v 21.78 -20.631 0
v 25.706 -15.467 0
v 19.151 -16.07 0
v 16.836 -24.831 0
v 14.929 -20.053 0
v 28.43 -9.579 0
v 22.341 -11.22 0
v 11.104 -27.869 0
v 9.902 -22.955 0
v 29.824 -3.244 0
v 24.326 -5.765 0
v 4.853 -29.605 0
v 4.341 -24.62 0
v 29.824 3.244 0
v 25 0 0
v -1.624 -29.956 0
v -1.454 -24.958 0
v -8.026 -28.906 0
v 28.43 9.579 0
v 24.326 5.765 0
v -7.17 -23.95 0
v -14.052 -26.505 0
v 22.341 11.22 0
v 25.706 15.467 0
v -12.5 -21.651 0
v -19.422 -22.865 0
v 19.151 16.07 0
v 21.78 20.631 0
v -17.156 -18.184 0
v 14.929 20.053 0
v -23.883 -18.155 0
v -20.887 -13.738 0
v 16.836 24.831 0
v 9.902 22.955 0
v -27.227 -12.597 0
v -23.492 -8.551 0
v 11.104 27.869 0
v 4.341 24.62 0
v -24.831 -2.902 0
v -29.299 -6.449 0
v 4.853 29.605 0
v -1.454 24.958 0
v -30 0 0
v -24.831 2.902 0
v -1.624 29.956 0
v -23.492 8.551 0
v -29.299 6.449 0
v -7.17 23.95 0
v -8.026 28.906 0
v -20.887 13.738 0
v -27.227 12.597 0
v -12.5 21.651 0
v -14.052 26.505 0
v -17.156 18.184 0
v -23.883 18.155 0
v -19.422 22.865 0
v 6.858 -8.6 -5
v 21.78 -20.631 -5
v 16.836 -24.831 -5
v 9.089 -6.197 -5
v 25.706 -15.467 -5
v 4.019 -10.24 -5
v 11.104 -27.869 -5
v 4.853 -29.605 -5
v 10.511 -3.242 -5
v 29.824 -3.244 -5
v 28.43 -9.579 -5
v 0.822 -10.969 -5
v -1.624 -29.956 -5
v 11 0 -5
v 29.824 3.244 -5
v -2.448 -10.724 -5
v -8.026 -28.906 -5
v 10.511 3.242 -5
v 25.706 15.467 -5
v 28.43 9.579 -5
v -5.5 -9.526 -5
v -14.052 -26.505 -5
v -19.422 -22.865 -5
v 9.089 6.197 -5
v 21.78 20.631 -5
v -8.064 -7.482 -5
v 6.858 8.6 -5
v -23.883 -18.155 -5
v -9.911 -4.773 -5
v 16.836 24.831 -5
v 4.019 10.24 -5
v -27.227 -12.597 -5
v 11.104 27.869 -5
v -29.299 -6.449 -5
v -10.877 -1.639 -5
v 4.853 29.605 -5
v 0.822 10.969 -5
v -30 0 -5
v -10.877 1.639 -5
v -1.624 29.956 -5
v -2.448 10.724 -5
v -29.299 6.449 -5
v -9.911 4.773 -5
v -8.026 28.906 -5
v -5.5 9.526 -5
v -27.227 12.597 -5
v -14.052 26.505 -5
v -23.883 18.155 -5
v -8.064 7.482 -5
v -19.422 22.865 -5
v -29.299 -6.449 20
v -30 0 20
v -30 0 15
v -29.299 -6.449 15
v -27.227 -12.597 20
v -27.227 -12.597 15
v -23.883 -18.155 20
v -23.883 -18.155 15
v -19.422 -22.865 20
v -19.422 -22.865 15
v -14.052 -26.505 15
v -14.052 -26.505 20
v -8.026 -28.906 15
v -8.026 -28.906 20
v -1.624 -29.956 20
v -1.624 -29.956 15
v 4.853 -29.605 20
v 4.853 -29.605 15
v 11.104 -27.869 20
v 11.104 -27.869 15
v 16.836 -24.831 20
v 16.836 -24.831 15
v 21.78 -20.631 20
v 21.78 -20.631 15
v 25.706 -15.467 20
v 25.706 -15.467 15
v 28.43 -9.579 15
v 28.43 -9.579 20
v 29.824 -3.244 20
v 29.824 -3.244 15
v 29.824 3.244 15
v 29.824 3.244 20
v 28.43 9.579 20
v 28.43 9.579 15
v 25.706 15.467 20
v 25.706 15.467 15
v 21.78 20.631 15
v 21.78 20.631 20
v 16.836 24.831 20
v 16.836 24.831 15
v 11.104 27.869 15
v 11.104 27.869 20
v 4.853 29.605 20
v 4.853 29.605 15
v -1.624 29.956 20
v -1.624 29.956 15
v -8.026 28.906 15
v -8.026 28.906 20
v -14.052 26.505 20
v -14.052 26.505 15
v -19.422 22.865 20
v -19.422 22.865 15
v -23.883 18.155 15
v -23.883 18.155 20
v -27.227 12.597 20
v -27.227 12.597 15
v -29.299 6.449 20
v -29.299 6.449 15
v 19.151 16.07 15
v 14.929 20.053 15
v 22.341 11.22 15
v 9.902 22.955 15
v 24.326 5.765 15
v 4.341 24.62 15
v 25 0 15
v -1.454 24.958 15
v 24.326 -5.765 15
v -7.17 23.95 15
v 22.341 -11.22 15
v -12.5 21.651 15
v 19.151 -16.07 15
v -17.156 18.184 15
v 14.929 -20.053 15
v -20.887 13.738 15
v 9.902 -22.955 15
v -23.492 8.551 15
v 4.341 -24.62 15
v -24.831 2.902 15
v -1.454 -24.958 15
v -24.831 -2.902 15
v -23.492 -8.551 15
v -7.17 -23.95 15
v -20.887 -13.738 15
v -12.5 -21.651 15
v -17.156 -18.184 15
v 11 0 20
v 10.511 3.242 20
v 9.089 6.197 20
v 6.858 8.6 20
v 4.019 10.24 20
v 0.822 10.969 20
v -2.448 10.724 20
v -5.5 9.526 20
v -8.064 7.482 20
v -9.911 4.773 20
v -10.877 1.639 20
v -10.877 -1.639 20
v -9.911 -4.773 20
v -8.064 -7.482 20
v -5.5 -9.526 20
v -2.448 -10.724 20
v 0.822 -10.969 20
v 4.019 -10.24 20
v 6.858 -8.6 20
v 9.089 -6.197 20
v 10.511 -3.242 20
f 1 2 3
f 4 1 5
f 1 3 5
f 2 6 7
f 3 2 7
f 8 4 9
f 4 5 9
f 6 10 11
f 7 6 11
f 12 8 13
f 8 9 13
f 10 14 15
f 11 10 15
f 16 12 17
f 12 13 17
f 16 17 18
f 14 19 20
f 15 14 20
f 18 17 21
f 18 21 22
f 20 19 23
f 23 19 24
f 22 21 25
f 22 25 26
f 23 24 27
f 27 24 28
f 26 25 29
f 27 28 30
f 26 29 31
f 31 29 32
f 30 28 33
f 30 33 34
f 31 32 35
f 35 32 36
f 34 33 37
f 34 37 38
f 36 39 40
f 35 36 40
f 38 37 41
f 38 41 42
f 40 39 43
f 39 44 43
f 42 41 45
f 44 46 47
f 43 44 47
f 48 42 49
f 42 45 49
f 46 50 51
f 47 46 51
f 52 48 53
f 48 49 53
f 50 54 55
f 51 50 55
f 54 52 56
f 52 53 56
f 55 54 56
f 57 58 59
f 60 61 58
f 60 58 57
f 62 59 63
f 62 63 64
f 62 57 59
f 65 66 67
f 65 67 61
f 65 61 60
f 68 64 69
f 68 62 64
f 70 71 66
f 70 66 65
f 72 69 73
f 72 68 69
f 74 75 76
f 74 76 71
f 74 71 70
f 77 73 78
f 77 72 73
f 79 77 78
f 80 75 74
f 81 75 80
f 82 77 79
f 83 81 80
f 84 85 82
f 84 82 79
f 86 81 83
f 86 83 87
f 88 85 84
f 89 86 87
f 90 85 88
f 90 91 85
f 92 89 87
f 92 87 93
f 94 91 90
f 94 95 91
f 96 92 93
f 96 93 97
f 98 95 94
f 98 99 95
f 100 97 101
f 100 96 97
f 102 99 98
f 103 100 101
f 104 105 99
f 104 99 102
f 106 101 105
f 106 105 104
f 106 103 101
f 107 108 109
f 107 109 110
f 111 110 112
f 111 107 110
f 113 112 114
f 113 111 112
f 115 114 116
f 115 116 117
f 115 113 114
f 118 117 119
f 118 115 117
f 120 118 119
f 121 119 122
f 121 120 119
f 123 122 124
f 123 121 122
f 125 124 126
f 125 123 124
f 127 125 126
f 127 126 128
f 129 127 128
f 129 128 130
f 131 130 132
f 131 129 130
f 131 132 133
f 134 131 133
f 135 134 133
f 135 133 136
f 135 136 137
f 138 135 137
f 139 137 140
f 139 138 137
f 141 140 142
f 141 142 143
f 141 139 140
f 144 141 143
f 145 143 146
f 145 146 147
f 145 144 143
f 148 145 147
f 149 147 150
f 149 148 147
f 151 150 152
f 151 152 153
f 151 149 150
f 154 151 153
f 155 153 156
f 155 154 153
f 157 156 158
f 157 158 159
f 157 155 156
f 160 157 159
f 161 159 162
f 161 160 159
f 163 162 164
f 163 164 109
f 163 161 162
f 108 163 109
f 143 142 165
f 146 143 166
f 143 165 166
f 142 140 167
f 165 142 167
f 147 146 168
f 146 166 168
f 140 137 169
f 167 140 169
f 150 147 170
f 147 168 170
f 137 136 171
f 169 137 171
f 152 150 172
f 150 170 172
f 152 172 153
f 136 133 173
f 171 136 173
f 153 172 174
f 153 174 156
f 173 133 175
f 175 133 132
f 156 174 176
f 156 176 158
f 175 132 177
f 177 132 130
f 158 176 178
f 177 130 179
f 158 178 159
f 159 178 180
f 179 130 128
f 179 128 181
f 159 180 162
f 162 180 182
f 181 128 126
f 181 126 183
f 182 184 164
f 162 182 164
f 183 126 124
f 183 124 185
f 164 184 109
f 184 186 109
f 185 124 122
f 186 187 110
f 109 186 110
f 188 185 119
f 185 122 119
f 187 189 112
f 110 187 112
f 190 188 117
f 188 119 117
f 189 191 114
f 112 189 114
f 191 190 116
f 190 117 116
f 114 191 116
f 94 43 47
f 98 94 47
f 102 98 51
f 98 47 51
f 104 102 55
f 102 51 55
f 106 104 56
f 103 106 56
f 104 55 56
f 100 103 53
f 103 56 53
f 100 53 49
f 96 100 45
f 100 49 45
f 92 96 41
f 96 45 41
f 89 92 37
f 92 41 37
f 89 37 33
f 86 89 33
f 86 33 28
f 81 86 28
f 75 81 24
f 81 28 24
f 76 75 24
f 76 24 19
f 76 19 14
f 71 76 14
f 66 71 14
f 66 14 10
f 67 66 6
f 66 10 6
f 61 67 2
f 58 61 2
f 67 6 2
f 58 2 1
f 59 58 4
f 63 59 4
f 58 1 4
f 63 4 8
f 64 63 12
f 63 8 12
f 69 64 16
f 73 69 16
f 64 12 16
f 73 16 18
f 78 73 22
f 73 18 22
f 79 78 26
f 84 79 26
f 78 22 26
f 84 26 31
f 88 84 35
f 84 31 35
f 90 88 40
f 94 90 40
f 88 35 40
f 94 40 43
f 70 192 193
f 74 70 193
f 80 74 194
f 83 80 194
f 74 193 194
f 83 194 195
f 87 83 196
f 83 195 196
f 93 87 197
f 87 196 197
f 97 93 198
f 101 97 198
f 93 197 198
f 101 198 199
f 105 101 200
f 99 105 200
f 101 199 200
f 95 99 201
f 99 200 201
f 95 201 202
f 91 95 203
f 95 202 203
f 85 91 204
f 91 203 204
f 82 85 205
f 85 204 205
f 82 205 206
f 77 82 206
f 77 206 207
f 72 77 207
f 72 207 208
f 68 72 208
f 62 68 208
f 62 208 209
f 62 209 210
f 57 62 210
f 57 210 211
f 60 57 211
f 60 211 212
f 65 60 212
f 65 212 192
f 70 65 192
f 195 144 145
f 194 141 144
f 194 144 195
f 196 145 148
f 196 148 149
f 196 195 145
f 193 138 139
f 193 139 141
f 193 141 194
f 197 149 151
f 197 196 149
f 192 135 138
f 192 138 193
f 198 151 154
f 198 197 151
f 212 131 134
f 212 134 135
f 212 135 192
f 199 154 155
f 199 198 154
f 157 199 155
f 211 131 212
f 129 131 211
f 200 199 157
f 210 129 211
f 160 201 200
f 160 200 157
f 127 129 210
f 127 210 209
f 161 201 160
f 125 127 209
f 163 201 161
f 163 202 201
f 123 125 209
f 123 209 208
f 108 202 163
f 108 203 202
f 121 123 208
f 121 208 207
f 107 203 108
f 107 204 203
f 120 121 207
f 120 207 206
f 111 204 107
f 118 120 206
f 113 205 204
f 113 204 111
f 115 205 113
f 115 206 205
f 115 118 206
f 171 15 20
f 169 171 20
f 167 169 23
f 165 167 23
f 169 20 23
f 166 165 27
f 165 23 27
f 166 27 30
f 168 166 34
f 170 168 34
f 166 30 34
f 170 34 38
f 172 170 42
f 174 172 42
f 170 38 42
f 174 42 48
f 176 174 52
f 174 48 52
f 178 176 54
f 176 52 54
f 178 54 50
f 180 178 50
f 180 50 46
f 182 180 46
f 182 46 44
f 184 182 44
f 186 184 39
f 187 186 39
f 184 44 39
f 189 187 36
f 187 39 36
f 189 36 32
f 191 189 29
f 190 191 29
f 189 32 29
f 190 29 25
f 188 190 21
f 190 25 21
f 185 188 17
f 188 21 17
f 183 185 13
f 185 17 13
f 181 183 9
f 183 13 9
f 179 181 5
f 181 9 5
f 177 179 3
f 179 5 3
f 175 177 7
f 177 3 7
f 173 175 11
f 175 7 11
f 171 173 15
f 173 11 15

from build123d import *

# Parameters (mm, degrees)
IZIM1_R                     = 25
Y_KSEKLIK_EKSTR_ZYON1_DEPTH = 15
IZIM3_R                     = 30
Y_KSEKLIK_EKSTR_ZYON2_DEPTH = 5
Y_KSEKLIK_EKSTR_ZYON3_START = 5
IZIM4_R                     = 30
Y_KSEKLIK_EKSTR_ZYON3_DEPTH = 5
IZIM5_R                     = 11
KES_EKSTR_ZYON1_DEPTH       = 50.244289009


with BuildPart() as part:
    # Çizim1 → Yükseklik-Ekstrüzyon1 (new body)
    with BuildSketch(Plane.XY):
        Circle(IZIM1_R)
    extrude(amount=Y_KSEKLIK_EKSTR_ZYON1_DEPTH)

    # Çizim3 → Yükseklik-Ekstrüzyon2 (add)
    with BuildSketch(Plane(origin=(0, 0, 0), x_dir=(-1, 0, 0), z_dir=(0, 0, -1))):
        Circle(IZIM3_R)
    extrude(amount=Y_KSEKLIK_EKSTR_ZYON2_DEPTH)

    # Çizim4 → Yükseklik-Ekstrüzyon3 (add)
    with BuildSketch(Plane.XY.offset(15).offset(Y_KSEKLIK_EKSTR_ZYON3_START)):
        with Locations(Location((0, 0, 0), (0, 0, 180))):
            Circle(IZIM4_R)
    extrude(amount=-Y_KSEKLIK_EKSTR_ZYON3_DEPTH)

    # Çizim5 → Kes-Ekstrüzyon1 (cut, through all)
    with BuildSketch(Plane.XY.offset(20)):
        Circle(IZIM5_R)
    extrude(amount=-KES_EKSTR_ZYON1_DEPTH, mode=Mode.SUBTRACT)


solid = part.part
